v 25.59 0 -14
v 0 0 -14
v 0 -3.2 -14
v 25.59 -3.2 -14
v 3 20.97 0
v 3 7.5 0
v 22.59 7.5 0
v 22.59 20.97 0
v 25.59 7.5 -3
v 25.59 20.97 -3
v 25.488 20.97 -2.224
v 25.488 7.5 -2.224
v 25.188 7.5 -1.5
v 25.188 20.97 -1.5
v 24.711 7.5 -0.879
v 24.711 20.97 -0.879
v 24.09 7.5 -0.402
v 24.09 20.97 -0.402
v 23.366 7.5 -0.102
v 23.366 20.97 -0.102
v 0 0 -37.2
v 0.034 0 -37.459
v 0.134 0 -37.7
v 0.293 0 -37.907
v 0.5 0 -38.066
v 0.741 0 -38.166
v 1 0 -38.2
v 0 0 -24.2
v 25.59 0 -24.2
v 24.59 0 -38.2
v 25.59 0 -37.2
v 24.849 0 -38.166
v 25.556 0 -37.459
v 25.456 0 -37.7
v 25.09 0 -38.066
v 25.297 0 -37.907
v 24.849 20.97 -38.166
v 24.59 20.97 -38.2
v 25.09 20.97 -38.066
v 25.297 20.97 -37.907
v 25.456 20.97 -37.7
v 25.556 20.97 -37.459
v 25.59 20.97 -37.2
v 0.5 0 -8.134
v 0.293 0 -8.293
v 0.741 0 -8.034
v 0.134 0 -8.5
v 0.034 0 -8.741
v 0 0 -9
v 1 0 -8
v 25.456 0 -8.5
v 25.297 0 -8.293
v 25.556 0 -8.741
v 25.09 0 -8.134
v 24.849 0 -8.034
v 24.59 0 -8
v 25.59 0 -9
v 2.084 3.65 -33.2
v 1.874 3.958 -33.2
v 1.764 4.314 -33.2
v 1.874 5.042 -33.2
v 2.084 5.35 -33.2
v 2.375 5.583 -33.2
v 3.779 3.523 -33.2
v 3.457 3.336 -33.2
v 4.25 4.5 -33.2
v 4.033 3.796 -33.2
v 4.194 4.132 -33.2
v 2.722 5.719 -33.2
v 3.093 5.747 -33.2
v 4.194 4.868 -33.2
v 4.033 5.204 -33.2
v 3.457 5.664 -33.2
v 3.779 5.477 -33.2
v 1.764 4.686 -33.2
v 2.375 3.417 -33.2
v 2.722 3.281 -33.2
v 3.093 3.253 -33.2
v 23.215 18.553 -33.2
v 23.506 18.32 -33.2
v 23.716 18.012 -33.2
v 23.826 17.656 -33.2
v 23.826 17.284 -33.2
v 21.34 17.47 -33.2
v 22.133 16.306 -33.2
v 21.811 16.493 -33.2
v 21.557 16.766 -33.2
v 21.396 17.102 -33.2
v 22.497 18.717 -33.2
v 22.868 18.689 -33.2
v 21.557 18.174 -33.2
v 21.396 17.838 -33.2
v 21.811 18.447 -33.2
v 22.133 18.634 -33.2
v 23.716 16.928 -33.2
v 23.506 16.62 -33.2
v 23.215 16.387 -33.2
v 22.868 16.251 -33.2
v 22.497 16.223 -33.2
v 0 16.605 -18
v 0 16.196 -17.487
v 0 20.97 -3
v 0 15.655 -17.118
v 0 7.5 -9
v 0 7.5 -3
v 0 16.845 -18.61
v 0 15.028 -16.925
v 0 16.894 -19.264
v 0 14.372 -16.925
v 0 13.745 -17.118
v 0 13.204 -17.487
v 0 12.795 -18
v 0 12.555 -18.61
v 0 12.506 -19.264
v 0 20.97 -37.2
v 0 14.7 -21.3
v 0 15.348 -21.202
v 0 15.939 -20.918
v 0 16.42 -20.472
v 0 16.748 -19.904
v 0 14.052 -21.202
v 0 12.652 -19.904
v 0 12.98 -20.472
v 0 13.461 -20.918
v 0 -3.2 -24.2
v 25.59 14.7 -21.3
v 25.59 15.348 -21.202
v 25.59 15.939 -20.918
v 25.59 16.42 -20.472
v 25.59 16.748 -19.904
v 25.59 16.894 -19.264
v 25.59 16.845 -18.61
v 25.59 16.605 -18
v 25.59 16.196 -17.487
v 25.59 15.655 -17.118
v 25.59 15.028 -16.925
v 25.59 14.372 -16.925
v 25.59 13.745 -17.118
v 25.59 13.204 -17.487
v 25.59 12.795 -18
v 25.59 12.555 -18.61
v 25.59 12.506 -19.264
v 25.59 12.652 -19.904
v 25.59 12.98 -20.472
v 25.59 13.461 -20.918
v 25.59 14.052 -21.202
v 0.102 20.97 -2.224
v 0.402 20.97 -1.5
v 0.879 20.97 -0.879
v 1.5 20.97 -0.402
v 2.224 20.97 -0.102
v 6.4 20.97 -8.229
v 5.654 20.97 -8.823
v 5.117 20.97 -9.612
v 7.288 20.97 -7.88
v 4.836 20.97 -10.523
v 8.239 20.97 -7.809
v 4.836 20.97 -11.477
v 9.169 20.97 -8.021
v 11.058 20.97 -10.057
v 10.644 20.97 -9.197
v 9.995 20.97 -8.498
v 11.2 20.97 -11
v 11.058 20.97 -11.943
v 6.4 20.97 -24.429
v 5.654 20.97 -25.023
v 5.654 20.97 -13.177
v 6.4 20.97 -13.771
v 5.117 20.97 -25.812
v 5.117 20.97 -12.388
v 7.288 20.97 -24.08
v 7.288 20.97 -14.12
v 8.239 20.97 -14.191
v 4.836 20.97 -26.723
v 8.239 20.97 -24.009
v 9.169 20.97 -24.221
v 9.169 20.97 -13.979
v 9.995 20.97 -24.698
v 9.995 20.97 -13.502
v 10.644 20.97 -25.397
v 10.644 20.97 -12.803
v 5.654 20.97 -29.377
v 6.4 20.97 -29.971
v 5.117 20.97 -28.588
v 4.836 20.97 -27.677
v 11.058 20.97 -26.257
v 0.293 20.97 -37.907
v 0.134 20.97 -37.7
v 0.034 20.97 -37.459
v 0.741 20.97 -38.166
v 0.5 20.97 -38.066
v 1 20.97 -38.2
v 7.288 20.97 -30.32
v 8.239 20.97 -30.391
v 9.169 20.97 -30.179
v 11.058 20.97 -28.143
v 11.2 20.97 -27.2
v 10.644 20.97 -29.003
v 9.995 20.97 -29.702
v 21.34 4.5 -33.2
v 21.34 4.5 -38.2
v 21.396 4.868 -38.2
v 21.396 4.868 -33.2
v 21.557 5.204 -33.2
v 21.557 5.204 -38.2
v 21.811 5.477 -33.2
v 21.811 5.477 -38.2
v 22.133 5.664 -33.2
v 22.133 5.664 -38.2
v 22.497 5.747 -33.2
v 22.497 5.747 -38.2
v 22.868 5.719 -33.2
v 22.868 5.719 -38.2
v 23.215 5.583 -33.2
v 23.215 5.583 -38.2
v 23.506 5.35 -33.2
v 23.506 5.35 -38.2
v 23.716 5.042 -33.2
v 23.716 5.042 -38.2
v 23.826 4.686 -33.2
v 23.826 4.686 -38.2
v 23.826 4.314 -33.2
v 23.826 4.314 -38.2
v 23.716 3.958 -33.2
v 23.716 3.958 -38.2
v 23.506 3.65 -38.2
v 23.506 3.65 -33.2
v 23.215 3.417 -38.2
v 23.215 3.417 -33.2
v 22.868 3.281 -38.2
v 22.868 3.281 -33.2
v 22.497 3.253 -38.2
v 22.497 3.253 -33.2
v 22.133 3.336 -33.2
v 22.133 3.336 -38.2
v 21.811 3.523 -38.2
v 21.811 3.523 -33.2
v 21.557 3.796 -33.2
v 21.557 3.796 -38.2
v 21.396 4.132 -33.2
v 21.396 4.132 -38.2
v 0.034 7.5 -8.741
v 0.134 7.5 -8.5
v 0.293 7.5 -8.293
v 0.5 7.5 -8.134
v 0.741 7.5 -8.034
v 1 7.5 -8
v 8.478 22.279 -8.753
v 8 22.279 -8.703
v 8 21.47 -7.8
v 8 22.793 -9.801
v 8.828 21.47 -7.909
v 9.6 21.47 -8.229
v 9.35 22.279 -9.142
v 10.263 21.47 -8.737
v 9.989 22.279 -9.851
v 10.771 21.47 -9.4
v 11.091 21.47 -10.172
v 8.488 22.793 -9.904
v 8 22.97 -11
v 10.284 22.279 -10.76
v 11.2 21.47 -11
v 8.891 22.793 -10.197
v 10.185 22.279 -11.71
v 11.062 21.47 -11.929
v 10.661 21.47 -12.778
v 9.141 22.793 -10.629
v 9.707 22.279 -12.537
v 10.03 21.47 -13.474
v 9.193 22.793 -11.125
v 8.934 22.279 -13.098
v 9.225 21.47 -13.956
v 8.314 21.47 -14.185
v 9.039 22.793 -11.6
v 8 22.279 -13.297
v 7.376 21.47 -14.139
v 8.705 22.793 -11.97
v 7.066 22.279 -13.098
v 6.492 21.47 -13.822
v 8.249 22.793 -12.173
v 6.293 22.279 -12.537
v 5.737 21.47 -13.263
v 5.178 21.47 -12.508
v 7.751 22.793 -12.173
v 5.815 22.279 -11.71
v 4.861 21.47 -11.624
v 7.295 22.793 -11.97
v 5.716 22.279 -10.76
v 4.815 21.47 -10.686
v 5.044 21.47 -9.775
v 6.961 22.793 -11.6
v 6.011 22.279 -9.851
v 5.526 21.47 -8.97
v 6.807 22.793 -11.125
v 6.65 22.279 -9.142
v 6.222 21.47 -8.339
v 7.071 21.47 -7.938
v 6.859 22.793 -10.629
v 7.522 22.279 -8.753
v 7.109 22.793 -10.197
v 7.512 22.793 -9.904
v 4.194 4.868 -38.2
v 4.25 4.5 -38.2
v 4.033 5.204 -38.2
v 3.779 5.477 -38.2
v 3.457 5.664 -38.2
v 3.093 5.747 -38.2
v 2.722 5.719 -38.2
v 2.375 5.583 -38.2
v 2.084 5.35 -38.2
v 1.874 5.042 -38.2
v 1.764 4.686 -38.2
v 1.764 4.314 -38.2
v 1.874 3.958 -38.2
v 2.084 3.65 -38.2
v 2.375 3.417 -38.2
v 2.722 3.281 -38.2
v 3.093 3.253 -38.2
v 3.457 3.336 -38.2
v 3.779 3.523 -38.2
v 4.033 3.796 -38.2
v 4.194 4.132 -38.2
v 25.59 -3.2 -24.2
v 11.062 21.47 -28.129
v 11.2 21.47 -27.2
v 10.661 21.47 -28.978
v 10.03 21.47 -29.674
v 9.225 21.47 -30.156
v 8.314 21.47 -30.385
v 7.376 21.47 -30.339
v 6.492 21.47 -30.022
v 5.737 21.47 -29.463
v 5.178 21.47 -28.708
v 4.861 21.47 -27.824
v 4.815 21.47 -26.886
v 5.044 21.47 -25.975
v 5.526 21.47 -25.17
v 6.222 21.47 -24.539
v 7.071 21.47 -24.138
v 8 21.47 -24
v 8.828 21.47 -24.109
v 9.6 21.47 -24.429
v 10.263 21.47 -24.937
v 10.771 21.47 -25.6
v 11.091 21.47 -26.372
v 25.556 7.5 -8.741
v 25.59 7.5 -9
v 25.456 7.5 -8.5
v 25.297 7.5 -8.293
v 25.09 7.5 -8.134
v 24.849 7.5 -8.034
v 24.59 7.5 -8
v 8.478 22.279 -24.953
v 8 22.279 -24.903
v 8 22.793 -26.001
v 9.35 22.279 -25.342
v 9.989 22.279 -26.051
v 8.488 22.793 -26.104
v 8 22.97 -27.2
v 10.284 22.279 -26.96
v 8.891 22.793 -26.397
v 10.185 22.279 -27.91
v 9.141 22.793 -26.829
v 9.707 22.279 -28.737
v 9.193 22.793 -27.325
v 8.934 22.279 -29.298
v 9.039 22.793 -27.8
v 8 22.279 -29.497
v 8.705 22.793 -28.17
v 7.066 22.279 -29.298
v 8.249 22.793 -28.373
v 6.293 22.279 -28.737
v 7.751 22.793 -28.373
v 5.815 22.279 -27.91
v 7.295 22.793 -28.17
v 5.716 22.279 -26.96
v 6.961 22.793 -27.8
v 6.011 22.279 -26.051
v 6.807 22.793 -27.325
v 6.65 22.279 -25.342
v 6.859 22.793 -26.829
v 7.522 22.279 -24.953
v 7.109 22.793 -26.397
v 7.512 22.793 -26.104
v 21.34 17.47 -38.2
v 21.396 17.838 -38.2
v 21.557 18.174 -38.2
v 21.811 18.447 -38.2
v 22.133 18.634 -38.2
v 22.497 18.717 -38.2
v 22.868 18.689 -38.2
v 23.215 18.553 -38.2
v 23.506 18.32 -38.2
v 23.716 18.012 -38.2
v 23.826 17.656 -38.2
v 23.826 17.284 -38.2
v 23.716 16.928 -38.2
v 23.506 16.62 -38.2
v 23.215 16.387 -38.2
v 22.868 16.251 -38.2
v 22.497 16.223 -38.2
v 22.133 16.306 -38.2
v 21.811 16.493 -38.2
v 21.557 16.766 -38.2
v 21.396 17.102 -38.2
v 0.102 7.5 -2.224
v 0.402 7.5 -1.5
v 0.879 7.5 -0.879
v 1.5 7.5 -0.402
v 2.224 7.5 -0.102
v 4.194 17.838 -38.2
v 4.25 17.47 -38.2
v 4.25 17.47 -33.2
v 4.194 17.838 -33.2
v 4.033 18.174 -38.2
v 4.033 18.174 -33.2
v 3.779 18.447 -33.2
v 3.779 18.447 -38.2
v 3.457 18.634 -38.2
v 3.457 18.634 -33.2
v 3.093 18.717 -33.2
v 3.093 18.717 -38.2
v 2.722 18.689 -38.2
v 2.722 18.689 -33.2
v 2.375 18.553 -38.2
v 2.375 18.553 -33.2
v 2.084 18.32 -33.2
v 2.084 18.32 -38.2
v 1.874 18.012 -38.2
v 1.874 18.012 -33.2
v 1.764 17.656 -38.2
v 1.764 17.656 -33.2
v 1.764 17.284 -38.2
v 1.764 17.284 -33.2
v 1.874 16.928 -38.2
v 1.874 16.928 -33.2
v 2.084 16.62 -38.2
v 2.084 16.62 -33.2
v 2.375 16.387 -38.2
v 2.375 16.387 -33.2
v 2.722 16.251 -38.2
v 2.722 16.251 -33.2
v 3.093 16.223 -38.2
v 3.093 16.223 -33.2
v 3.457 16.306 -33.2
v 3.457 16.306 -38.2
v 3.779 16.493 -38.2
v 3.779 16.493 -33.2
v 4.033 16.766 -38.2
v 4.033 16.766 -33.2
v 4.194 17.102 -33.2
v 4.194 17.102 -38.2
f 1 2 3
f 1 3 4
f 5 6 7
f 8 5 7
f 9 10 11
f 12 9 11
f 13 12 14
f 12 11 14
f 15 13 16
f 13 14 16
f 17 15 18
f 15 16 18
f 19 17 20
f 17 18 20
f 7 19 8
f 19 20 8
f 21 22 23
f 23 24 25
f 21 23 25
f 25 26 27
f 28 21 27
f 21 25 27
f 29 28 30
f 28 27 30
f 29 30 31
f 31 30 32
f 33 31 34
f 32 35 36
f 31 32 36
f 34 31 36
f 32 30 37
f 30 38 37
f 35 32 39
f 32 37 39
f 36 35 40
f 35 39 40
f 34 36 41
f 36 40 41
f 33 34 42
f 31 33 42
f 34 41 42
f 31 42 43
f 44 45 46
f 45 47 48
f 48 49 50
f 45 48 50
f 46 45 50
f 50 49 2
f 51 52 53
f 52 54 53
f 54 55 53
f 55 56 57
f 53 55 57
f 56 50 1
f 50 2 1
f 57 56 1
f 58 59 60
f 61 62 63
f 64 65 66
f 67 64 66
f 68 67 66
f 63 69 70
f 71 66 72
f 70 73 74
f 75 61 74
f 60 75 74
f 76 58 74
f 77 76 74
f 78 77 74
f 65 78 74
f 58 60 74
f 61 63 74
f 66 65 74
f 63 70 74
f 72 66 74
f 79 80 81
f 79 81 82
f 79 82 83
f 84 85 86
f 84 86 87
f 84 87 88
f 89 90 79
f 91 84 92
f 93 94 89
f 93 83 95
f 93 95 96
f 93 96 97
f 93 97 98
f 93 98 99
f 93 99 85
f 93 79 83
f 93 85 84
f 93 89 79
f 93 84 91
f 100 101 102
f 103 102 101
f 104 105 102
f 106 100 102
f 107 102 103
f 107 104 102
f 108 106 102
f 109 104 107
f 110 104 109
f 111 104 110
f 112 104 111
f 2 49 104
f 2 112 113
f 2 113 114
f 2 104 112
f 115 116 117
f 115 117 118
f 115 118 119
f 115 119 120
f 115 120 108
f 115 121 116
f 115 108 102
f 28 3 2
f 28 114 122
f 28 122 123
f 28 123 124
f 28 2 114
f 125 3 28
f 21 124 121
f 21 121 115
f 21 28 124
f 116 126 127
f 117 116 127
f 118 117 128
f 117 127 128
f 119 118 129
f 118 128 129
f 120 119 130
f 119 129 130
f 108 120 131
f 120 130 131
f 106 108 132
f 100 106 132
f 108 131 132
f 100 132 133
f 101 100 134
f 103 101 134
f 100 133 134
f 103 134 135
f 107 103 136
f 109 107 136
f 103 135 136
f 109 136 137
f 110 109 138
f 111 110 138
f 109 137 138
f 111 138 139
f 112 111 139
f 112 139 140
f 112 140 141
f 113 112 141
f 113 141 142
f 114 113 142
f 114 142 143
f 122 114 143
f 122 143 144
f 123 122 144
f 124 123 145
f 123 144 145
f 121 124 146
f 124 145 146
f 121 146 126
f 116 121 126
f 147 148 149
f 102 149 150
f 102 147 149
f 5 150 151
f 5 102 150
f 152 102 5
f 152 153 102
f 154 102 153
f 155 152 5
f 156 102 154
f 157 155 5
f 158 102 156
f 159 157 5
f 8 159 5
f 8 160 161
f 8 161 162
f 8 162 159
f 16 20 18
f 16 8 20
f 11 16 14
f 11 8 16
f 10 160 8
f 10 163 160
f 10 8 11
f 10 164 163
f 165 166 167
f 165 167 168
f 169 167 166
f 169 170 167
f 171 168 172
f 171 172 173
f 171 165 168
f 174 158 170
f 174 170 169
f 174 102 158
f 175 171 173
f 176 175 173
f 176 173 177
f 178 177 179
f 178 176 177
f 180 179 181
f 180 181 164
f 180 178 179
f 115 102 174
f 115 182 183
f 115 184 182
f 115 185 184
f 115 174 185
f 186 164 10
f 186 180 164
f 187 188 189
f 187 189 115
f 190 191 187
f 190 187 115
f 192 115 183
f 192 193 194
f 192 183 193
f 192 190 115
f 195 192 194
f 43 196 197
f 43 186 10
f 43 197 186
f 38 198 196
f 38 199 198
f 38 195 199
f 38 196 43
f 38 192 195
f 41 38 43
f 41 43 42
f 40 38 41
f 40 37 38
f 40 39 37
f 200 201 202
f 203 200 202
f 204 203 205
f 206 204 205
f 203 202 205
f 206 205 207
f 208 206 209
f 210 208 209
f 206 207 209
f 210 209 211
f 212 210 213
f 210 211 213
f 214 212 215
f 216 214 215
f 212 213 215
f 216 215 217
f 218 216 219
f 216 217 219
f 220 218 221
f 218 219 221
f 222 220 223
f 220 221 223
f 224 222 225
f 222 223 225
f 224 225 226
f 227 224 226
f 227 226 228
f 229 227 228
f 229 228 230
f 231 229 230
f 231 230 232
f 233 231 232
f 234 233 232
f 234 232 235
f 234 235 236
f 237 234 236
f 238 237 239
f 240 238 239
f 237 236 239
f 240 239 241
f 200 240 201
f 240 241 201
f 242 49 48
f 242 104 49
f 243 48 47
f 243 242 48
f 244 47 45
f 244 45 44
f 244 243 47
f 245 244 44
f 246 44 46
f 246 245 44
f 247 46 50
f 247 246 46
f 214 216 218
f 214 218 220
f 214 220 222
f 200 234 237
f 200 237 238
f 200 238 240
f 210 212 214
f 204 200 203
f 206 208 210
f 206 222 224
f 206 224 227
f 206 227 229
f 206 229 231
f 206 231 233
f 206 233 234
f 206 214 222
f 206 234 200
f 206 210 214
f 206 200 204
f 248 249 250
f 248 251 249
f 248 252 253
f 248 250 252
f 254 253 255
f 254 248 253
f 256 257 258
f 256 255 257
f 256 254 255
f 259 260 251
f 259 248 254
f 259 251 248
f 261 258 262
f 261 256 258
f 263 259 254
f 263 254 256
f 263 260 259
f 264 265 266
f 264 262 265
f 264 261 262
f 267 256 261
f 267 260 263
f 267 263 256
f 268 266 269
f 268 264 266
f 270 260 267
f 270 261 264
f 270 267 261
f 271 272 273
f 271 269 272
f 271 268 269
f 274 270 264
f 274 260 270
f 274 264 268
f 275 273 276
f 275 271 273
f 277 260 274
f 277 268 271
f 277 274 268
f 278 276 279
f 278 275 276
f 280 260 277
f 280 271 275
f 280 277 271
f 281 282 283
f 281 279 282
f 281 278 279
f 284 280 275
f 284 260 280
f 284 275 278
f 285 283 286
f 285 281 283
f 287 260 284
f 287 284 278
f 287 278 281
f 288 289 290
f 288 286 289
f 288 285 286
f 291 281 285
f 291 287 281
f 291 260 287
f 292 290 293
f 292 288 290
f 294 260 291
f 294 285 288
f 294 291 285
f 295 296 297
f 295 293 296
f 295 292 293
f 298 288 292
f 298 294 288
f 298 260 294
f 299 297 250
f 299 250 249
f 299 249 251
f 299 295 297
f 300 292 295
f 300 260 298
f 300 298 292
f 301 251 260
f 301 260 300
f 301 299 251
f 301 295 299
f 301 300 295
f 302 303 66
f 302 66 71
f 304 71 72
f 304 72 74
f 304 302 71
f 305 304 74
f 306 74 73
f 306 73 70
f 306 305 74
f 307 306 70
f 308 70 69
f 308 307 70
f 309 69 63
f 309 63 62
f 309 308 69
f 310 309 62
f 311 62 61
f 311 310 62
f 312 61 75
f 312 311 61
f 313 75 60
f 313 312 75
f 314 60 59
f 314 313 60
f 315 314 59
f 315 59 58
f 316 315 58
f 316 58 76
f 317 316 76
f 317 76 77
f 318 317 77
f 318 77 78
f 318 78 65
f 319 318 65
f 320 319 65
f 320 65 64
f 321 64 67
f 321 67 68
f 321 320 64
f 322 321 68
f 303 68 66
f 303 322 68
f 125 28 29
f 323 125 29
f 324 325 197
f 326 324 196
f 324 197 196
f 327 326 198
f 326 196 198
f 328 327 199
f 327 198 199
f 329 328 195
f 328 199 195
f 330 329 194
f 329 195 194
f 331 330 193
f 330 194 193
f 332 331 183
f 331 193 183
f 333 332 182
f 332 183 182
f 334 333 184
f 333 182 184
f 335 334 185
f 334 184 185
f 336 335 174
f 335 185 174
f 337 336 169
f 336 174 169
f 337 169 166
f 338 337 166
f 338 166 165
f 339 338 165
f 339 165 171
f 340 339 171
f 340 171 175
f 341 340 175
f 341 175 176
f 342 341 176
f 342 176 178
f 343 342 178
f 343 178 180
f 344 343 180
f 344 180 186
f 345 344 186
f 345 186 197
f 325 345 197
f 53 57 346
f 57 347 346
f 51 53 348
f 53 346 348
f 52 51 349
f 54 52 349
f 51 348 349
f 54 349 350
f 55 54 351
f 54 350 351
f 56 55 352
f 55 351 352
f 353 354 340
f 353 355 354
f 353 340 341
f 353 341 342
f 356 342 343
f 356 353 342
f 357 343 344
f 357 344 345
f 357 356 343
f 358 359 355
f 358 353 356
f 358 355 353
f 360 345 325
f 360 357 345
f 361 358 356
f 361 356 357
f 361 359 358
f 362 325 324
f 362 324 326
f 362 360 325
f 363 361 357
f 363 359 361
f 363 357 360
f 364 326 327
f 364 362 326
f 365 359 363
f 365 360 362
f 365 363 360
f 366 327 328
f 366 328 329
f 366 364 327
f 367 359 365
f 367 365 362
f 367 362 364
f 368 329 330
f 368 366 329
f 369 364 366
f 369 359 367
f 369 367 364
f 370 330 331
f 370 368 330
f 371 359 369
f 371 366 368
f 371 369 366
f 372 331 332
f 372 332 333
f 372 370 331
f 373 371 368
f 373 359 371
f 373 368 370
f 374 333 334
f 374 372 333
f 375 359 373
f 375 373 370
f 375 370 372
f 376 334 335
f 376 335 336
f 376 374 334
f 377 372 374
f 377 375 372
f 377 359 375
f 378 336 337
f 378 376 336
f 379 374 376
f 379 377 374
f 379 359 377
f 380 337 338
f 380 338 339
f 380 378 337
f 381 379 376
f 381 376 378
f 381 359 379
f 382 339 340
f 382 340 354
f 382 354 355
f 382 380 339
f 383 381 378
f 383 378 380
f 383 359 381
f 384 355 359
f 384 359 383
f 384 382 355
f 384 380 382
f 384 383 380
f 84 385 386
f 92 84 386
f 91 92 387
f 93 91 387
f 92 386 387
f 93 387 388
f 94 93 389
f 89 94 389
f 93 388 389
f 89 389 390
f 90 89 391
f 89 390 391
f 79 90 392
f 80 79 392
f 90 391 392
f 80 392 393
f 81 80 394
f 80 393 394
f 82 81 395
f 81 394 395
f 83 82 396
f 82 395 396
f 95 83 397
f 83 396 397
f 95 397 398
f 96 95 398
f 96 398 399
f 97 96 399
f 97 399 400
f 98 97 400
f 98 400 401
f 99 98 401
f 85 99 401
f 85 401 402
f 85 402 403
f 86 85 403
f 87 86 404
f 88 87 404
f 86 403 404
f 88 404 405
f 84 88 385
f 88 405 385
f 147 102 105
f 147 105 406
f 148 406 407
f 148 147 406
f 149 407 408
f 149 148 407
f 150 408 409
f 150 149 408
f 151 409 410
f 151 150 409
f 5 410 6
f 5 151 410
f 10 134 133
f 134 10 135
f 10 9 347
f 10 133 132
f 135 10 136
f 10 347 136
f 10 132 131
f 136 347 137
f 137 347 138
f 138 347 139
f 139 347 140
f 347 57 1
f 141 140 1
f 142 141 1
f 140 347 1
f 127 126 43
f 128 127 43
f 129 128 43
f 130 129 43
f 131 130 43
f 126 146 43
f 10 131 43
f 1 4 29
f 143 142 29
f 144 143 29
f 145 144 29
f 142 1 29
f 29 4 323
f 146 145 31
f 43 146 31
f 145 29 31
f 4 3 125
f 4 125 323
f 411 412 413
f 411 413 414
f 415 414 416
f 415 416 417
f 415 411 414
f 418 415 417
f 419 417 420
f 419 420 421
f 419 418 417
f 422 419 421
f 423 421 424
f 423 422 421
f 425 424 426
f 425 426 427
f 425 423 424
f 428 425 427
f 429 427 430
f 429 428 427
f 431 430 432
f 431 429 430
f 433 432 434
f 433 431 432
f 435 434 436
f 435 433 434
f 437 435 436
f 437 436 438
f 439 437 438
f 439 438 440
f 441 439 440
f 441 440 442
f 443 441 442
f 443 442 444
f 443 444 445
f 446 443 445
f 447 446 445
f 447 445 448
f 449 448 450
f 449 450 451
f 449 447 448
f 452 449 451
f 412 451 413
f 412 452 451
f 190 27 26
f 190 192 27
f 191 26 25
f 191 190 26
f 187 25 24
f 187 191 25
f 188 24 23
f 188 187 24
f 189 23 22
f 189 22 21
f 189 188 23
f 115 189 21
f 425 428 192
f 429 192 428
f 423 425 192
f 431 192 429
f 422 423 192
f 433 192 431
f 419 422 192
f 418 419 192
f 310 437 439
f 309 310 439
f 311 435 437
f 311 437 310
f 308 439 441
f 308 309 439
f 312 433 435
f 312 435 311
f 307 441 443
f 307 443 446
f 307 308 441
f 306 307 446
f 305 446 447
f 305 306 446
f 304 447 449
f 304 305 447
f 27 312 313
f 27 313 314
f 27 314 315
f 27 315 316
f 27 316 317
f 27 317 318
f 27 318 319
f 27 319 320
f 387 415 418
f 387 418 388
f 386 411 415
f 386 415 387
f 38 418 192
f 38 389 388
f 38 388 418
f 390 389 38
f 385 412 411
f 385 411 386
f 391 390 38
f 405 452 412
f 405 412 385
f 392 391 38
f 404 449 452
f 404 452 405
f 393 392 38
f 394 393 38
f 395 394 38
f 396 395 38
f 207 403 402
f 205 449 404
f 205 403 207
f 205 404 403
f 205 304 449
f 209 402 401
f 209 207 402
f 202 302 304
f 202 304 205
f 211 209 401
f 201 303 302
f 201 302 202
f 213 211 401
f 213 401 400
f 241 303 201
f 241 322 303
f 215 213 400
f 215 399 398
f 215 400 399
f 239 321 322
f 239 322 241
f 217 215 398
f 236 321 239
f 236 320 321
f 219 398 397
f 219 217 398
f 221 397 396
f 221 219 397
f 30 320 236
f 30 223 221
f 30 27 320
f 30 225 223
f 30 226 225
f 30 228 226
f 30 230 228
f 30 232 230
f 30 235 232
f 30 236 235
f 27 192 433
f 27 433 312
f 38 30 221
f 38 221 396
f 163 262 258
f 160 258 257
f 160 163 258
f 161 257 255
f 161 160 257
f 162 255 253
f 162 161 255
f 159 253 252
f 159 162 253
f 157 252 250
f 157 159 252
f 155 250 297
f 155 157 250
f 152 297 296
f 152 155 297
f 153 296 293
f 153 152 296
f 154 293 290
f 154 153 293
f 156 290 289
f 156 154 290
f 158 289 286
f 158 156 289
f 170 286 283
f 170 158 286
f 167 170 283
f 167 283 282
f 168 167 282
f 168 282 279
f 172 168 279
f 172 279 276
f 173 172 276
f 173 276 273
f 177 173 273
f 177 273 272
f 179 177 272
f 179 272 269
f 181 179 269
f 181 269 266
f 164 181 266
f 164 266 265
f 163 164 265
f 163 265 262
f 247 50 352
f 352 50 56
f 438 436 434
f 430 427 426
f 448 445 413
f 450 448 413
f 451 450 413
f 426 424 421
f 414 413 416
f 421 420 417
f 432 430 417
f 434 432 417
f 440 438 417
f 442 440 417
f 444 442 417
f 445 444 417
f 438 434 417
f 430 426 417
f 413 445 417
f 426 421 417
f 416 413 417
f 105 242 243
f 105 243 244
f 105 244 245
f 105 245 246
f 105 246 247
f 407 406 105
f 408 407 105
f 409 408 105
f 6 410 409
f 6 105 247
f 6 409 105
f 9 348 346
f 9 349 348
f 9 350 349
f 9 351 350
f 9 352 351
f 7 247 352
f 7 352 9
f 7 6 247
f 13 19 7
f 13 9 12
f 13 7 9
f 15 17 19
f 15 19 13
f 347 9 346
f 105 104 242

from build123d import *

# Parameters (mm, degrees)
SKETCH1_W           = 25.59
SKETCH1_H           = 38.2
BOSS_EXTRUDE1_DEPTH = 20.97
SKETCH2_W           = 25.59
SKETCH2_H           = 10.2
BOSS_EXTRUDE2_DEPTH = 3.2
SKETCH3_R           = 2.2
CUT_EXTRUDE1_DEPTH  = 25.59
SKETCH4_R           = 1.25
CUT_EXTRUDE2_DEPTH  = 5
FILLET1_R           = 1
FILLET2_R           = 1
FILLET3_R           = 3
SKETCH5_W           = 25.59
SKETCH5_H           = 8
CUT_EXTRUDE3_DEPTH  = 7.5
FILLET4_R           = 1
SKETCH6_R           = 3.2
BOSS_EXTRUDE4_DEPTH = 0.5
DOME1_FACE_RADIUS   = 3.2
DOME1_HEIGHT        = 1.5
DOME2_FACE_RADIUS   = 3.2
DOME2_HEIGHT        = 1.5


with BuildPart() as part:
    # Sketch1 → Boss-Extrude1 (new body)
    with BuildSketch(Plane(origin=(0, 0, 0), x_dir=(1, 0, 0), z_dir=(0, 1, 0))):
        with Locations((12.795, 19.1)):
            Rectangle(SKETCH1_W, SKETCH1_H)
    extrude(amount=BOSS_EXTRUDE1_DEPTH)

    # Sketch2 → Boss-Extrude2 (add)
    with BuildSketch(Plane.XZ):
        with Locations((12.795, -19.1)):
            Rectangle(SKETCH2_W, SKETCH2_H)
    extrude(amount=BOSS_EXTRUDE2_DEPTH)

    # Sketch3 → Cut-Extrude1 (cut)
    with BuildSketch(Plane(origin=(25.59, 0, 0), x_dir=(0, 0, -1), z_dir=(1, 0, 0))):
        with Locations((19.1, 14.7)):
            Circle(SKETCH3_R)
    extrude(amount=-CUT_EXTRUDE1_DEPTH, mode=Mode.SUBTRACT)

    # Sketch4 → Cut-Extrude2 (cut)
    with BuildSketch(Plane(origin=(0, 0, -38.2), x_dir=(-1, 0, 0), z_dir=(0, 0, -1))):
        with Locations((-22.59, 17.47)):
            Circle(SKETCH4_R)
        with Locations((-22.59, 4.5)):
            Circle(SKETCH4_R)
    cut_extrude2 = extrude(amount=-CUT_EXTRUDE2_DEPTH, mode=Mode.SUBTRACT)

    # Fillet1
    fillet1_edges = [part.edges().sort_by_distance(p)[0] for p in [
        (25.59, 10.485, -38.2),
    ]]
    fillet(fillet1_edges, radius=FILLET1_R)

    # Fillet2
    fillet2_edges = [part.edges().sort_by_distance(p)[0] for p in [
        (0, 10.485, -38.2),
    ]]
    fillet(fillet2_edges, radius=FILLET2_R)

    # Fillet3
    fillet3_edges = [part.edges().sort_by_distance(p)[0] for p in [
        (25.59, 10.485, 0),
        (0, 10.485, 0),
    ]]
    fillet(fillet3_edges, radius=FILLET3_R)

    # Sketch5 → Cut-Extrude3 (cut)
    with BuildSketch(Plane.XZ):
        with Locations((12.795, -4)):
            Rectangle(SKETCH5_W, SKETCH5_H)
    extrude(amount=-CUT_EXTRUDE3_DEPTH, mode=Mode.SUBTRACT)

    # Fillet4
    fillet4_edges = [part.edges().sort_by_distance(p)[0] for p in [
        (0, 3.75, -8),
        (25.59, 3.75, -8),
    ]]
    fillet(fillet4_edges, radius=FILLET4_R)

    # Sketch6 → Boss-Extrude4 (add)
    with BuildSketch(Plane(origin=(0, 20.97, 0), x_dir=(1, 0, 0), z_dir=(0, 1, 0))):
        with Locations((8, 27.2)):
            Circle(SKETCH6_R)
    boss_extrude4 = extrude(amount=BOSS_EXTRUDE4_DEPTH)

    # Mirror3: Boss-Extrude4 across plane
    add(boss_extrude4.mirror(Plane(origin=(0, 0, -19.1), x_dir=(1, 0, 0), z_dir=(0, 0, -1))))

    # Dome1: a dome of height H over a round flat face of radius A is a cap of a sphere of radius (A * A + H * H) / (2 * H)
    dome1_r = (DOME1_FACE_RADIUS * DOME1_FACE_RADIUS + DOME1_HEIGHT * DOME1_HEIGHT) / (2 * DOME1_HEIGHT)
    dome1_base = Plane((8, 21.47, -11), z_dir=(0, 1, 0))
    with Locations(dome1_base.offset(DOME1_HEIGHT - dome1_r)):
        dome1_ball = Sphere(dome1_r, mode=Mode.PRIVATE)
    add(split(dome1_ball, bisect_by=dome1_base, keep=Keep.TOP, mode=Mode.PRIVATE))

    # Dome2: a dome of height H over a round flat face of radius A is a cap of a sphere of radius (A * A + H * H) / (2 * H)
    dome2_r = (DOME2_FACE_RADIUS * DOME2_FACE_RADIUS + DOME2_HEIGHT * DOME2_HEIGHT) / (2 * DOME2_HEIGHT)
    dome2_base = Plane((8, 21.47, -27.2), z_dir=(0, 1, 0))
    with Locations(dome2_base.offset(DOME2_HEIGHT - dome2_r)):
        dome2_ball = Sphere(dome2_r, mode=Mode.PRIVATE)
    add(split(dome2_ball, bisect_by=dome2_base, keep=Keep.TOP, mode=Mode.PRIVATE))

    # Mirror4: Cut-Extrude2 across plane
    add(cut_extrude2.mirror(Plane(origin=(12.795, 0, 0), x_dir=(0, 0, 1), z_dir=(1, 0, 0))), mode=Mode.SUBTRACT)


solid = part.part
